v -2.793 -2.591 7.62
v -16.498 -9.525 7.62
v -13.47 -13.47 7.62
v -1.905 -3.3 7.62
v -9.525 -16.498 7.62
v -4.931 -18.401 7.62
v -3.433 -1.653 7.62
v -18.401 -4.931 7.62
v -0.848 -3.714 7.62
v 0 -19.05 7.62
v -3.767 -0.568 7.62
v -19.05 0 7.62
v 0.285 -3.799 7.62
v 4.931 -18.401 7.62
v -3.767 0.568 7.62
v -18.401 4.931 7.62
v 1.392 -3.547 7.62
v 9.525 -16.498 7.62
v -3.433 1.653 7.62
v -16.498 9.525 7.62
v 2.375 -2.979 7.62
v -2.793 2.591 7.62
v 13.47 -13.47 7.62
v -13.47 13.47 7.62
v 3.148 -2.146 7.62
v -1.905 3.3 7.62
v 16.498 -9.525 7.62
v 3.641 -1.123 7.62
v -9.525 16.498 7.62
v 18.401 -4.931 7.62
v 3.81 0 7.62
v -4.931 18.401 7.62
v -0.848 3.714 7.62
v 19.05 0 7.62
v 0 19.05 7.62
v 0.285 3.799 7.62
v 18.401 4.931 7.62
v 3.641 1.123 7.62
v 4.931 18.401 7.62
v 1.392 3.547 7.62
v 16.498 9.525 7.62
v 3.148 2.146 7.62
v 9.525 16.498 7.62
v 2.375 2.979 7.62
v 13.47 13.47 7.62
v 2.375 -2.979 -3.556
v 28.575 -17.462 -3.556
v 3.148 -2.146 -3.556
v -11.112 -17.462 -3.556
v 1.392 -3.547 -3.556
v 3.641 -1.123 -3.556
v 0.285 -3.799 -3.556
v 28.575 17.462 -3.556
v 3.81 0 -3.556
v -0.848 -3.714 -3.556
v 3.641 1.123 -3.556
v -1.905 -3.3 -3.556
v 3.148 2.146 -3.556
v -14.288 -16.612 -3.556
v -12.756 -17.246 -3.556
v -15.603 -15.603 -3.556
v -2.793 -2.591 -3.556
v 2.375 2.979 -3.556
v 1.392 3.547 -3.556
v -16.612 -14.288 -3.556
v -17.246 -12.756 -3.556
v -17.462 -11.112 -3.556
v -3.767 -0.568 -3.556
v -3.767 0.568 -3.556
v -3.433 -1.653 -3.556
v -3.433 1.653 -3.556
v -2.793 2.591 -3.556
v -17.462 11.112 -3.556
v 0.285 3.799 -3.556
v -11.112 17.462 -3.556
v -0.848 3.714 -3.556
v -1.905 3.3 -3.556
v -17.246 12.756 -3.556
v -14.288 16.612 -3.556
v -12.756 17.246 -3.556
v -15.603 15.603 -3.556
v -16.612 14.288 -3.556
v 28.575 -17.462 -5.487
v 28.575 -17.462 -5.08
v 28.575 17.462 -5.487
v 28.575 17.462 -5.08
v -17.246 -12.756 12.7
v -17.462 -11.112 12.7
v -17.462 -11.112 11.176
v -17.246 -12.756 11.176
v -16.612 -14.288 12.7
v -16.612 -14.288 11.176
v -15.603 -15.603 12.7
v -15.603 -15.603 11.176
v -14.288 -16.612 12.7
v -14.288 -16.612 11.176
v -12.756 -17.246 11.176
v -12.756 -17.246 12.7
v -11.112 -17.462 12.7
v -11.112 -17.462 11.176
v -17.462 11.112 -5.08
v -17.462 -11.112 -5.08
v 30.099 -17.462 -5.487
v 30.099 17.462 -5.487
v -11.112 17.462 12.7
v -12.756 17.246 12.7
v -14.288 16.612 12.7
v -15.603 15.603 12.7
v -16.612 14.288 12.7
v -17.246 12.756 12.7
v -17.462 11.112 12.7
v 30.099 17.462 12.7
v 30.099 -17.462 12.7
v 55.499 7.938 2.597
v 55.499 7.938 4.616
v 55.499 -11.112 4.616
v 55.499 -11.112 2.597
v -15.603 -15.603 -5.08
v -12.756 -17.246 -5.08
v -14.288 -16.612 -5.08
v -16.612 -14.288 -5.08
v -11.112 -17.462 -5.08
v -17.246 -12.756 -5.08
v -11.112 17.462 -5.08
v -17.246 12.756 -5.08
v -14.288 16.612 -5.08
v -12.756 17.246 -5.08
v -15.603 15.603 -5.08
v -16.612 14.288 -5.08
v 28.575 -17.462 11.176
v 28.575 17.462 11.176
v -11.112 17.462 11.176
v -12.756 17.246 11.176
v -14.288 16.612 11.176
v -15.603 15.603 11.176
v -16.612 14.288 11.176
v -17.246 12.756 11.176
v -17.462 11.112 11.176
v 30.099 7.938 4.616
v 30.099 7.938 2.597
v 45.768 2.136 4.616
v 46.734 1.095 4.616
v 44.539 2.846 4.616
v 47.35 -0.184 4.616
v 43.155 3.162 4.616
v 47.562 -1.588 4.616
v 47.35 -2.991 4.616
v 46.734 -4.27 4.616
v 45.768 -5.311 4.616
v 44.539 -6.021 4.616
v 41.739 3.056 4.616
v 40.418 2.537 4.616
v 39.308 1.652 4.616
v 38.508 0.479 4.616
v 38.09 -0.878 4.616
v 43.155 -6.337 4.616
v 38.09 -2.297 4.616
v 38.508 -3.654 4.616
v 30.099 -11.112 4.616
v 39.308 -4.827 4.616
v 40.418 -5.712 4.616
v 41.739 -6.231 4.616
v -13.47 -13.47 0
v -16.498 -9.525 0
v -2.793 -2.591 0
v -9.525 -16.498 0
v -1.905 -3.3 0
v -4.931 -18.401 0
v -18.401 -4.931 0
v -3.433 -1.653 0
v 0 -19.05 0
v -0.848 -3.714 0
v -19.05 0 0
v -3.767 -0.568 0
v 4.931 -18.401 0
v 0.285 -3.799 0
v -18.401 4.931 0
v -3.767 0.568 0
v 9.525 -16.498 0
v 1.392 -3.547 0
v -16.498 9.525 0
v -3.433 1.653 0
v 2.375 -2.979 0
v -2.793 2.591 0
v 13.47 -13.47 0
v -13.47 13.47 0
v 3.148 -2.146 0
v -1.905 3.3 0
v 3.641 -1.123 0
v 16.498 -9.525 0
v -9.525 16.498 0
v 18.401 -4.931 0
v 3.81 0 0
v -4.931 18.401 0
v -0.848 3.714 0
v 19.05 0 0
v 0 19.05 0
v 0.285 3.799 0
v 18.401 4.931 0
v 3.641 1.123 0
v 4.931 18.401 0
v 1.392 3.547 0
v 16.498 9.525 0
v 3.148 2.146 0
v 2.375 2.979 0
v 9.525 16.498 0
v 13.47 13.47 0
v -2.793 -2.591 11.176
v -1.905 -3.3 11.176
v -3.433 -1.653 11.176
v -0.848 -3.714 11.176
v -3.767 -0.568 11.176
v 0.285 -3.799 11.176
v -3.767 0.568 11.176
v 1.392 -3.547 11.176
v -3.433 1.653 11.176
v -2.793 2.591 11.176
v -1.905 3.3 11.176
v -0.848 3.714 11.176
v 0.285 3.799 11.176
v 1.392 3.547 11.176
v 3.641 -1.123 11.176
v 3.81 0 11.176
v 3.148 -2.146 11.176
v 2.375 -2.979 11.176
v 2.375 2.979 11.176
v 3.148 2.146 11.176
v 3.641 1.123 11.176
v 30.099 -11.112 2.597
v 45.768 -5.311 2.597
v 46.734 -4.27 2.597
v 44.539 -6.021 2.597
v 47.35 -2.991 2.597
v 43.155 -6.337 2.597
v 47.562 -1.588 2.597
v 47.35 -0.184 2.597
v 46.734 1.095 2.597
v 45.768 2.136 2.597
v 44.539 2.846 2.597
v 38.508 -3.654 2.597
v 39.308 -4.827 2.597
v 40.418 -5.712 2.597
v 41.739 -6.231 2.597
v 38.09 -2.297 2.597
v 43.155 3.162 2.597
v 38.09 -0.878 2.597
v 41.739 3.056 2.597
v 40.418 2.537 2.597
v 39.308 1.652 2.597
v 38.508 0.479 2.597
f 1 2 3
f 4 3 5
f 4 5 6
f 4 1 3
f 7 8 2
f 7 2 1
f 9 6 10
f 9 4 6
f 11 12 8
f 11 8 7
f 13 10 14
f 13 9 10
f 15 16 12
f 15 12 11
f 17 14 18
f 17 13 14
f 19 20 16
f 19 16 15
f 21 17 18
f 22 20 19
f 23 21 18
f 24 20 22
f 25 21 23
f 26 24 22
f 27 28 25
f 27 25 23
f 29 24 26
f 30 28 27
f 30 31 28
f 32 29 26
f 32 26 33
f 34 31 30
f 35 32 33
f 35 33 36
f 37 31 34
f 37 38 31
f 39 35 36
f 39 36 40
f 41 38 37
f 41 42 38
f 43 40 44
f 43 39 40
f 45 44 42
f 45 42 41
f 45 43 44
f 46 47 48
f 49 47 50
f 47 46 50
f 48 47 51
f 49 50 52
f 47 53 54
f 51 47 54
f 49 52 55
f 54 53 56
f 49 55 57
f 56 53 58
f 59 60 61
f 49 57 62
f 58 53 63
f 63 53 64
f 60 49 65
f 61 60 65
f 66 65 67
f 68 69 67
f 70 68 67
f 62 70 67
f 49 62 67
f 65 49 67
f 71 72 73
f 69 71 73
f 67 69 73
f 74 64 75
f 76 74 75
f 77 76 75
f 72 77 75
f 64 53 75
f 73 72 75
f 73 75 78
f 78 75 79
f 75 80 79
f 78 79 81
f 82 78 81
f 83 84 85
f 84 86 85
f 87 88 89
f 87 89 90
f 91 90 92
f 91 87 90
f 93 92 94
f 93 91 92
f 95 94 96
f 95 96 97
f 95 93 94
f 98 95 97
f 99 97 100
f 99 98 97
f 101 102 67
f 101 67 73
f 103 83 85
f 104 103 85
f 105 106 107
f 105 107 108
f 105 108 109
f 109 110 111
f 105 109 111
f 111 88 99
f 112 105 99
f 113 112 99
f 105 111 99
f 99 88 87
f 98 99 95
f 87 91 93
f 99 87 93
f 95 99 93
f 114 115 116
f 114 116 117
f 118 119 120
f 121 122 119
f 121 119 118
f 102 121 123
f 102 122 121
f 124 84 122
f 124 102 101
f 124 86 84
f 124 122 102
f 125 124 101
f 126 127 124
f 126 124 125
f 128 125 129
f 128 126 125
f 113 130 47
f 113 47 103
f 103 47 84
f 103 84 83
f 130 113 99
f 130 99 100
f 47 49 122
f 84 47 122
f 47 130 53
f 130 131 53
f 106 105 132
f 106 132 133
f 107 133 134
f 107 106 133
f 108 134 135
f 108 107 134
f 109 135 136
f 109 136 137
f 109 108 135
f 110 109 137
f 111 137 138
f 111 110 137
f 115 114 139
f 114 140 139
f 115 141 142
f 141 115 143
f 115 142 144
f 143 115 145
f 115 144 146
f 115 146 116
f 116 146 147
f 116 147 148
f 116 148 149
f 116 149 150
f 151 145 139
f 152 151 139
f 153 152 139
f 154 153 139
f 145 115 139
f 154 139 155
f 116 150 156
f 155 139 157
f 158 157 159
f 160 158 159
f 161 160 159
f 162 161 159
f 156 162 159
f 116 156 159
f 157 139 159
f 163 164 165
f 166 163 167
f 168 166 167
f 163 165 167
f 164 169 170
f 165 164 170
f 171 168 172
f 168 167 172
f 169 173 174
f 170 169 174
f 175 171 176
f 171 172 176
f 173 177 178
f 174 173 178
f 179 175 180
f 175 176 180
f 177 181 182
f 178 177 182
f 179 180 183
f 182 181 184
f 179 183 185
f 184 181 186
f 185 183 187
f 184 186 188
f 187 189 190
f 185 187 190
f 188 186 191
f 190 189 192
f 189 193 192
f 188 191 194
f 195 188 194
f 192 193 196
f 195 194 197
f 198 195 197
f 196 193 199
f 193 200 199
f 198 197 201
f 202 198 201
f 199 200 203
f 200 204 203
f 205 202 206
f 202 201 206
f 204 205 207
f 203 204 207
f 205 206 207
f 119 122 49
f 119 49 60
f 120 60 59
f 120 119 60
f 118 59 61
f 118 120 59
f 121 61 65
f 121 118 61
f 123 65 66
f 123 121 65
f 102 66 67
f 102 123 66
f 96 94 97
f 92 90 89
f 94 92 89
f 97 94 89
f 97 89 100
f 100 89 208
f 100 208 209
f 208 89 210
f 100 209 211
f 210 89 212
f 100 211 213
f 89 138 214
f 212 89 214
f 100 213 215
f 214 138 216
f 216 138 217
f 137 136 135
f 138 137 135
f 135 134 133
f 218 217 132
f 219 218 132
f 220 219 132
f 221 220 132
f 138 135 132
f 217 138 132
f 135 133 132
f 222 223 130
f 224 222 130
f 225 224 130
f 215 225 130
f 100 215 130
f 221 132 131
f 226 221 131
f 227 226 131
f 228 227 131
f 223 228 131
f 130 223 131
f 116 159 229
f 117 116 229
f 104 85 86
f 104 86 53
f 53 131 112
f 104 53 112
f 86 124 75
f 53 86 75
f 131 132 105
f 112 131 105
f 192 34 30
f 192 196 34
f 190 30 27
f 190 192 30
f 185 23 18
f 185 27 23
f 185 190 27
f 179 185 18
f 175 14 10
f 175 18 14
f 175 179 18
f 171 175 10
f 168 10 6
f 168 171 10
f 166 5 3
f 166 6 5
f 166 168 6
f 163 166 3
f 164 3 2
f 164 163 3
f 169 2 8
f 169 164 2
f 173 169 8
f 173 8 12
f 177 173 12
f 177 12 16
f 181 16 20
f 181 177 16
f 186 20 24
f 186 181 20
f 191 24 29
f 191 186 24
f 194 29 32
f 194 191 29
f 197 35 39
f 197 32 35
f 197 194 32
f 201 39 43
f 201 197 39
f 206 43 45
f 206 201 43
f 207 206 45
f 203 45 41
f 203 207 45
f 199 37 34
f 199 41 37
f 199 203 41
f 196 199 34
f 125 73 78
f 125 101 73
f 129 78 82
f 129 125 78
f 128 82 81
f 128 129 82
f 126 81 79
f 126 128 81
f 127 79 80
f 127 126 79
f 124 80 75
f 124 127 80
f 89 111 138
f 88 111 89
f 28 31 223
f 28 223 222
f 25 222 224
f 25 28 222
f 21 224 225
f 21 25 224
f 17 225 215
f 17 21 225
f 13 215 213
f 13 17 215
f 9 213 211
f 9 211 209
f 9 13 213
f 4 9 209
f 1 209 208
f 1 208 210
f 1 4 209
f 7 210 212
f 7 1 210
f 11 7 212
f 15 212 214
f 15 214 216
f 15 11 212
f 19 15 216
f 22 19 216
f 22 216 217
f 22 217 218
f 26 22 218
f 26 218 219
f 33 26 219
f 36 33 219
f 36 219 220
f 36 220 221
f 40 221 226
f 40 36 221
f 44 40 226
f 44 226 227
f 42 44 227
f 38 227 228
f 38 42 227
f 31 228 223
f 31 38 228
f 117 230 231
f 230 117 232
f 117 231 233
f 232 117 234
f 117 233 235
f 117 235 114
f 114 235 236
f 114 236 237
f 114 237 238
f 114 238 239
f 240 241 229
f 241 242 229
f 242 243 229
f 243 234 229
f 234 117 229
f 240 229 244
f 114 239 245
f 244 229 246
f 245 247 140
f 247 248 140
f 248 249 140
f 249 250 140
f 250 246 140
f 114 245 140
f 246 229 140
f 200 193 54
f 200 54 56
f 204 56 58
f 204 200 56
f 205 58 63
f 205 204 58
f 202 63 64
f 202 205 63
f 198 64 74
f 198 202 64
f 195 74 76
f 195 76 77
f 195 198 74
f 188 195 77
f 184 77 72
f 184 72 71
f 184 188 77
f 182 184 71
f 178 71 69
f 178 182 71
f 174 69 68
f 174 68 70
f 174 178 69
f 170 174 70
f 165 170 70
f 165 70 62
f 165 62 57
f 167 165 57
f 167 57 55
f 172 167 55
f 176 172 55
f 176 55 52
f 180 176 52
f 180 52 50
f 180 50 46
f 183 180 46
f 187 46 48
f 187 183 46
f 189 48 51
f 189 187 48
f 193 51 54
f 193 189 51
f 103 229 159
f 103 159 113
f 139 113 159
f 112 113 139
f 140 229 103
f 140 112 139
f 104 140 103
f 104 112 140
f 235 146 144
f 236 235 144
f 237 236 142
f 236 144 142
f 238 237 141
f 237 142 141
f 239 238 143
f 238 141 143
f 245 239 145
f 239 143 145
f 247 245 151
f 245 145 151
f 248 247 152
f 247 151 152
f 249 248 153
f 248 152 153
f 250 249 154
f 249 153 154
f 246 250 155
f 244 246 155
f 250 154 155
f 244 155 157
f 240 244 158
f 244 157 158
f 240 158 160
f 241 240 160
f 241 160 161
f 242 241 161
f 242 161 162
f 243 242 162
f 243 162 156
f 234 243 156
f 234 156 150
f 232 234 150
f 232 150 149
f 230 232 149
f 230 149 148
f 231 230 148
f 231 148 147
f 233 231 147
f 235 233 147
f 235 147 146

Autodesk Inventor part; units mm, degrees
ref_plane "YZ Plane" through (0, 0, 0) normal (1, 0, 0) x (0, 1, 0)
ref_plane "XZ Plane" through (0, 0, 0) normal (0, 1, 0) x (-1, 0, 0)
sketch "Sketch1" plane through (0, 0, 0) normal (0, 0, 1) x (1, 0, 0)
  circle A0 centre (0, 0) radius 19.05
  dimension "d0" = 38.1
extrude "wheel" add sketch "Sketch1" along normal blind 7.62
sketch "Sketch2" plane through (0, 0, 7.62) normal (0, 0, 1) x (1, 0, 0)
  circle A0 centre (0, 0) radius 19.05 projected
  circle A1 centre (0, 0) radius 3.81
  dimension "d4" = 7.62
extrude "axle" add sketch "Sketch2" along normal blind 5.08 and the other way blind 12.7 contours A1
sketch "Sketch3" plane through (0, 0, 12.7) normal (0, 0, 1) x (1, 0, 0)
  line L0 (-11.1125, -17.4625) -> (28.575, -17.4625)
  line L1 (28.575, -17.4625) -> (28.575, 17.4625)
  line L2 (28.575, 17.4625) -> (-11.1125, 17.4625)
  line L3 (-17.4625, 11.1125) -> (-17.4625, -11.1125)
  arc A0 (-11.1125, 17.4625) -> (-17.4625, 11.1125) centre (-11.1125, 11.1125) ccw
  arc A1 (-17.4625, -11.1125) -> (-11.1125, -17.4625) centre (-11.1125, -11.1125) ccw
  point P0 (-17.4625, -17.4625)
  point P1 (-17.4625, 17.4625)
  dimension "d13" = 6.35
extrude "side" add sketch "Sketch3" against normal blind 1.524
ref_plane "Work Plane1" through (0, 0, 3.81) normal (0, 0, -1) x (-1, 0, 0)
mirror "Mirror1" about plane through (0, 0, 3.81) normal (0, 0, -1) of "side"
sketch "Sketch4" plane through (28.575, -17.4625, 12.7) normal (1, 0, 0) x (0, 0, -1)
  line L0 (0, 0) -> (18.1871, 0)
  line L1 (18.1871, 0) -> (18.1871, 34.925)
  line L2 (18.1871, 34.925) -> (0, 34.925)
  line L3 (0, 34.925) -> (0, 0)
  point P0 (12.7, 17.4625)
extrude "Extrusion4" add sketch "Sketch4" along normal blind 1.524
sketch "Sketch5" plane through (30.099, -17.4625, 12.7) normal (1, 0, 0) x (0, 0, -1)
  line L0 (0, 0) -> (18.1871, 0) projected
  line L1 (18.1871, 34.925) -> (0, 34.925) projected
  line L2 (8.0841, 6.35) -> (10.103, 6.35)
  line L3 (10.103, 6.35) -> (10.103, 25.4)
  line L4 (10.103, 25.4) -> (8.0841, 25.4)
  line L5 (8.0841, 25.4) -> (8.0841, 6.35)
  line L6 (9.0935, 34.925) -> (9.0935, 0) construction
  line L7 (9.0935, 25.4) -> (9.0935, 6.35) construction
  point P0 (12.7, 17.4625)
extrude "Extrusion5" add sketch "Sketch5" along normal blind 25.4
sketch "Sketch6" plane through (30.099, -11.1125, 4.6159) normal (0, 0, 1) x (1, 0, 0)
  line L0 (25.4, 19.05) -> (25.4, 0) projected
  circle A0 centre (12.7, 9.525) radius 4.7625
  point P0 (-30.099, 11.1125)
  dimension "d19" = 12.7
extrude "Extrusion6" cut sketch "Sketch6" against normal blind 25.4
properties part number "0pulley" material "Steel, Alloy"
